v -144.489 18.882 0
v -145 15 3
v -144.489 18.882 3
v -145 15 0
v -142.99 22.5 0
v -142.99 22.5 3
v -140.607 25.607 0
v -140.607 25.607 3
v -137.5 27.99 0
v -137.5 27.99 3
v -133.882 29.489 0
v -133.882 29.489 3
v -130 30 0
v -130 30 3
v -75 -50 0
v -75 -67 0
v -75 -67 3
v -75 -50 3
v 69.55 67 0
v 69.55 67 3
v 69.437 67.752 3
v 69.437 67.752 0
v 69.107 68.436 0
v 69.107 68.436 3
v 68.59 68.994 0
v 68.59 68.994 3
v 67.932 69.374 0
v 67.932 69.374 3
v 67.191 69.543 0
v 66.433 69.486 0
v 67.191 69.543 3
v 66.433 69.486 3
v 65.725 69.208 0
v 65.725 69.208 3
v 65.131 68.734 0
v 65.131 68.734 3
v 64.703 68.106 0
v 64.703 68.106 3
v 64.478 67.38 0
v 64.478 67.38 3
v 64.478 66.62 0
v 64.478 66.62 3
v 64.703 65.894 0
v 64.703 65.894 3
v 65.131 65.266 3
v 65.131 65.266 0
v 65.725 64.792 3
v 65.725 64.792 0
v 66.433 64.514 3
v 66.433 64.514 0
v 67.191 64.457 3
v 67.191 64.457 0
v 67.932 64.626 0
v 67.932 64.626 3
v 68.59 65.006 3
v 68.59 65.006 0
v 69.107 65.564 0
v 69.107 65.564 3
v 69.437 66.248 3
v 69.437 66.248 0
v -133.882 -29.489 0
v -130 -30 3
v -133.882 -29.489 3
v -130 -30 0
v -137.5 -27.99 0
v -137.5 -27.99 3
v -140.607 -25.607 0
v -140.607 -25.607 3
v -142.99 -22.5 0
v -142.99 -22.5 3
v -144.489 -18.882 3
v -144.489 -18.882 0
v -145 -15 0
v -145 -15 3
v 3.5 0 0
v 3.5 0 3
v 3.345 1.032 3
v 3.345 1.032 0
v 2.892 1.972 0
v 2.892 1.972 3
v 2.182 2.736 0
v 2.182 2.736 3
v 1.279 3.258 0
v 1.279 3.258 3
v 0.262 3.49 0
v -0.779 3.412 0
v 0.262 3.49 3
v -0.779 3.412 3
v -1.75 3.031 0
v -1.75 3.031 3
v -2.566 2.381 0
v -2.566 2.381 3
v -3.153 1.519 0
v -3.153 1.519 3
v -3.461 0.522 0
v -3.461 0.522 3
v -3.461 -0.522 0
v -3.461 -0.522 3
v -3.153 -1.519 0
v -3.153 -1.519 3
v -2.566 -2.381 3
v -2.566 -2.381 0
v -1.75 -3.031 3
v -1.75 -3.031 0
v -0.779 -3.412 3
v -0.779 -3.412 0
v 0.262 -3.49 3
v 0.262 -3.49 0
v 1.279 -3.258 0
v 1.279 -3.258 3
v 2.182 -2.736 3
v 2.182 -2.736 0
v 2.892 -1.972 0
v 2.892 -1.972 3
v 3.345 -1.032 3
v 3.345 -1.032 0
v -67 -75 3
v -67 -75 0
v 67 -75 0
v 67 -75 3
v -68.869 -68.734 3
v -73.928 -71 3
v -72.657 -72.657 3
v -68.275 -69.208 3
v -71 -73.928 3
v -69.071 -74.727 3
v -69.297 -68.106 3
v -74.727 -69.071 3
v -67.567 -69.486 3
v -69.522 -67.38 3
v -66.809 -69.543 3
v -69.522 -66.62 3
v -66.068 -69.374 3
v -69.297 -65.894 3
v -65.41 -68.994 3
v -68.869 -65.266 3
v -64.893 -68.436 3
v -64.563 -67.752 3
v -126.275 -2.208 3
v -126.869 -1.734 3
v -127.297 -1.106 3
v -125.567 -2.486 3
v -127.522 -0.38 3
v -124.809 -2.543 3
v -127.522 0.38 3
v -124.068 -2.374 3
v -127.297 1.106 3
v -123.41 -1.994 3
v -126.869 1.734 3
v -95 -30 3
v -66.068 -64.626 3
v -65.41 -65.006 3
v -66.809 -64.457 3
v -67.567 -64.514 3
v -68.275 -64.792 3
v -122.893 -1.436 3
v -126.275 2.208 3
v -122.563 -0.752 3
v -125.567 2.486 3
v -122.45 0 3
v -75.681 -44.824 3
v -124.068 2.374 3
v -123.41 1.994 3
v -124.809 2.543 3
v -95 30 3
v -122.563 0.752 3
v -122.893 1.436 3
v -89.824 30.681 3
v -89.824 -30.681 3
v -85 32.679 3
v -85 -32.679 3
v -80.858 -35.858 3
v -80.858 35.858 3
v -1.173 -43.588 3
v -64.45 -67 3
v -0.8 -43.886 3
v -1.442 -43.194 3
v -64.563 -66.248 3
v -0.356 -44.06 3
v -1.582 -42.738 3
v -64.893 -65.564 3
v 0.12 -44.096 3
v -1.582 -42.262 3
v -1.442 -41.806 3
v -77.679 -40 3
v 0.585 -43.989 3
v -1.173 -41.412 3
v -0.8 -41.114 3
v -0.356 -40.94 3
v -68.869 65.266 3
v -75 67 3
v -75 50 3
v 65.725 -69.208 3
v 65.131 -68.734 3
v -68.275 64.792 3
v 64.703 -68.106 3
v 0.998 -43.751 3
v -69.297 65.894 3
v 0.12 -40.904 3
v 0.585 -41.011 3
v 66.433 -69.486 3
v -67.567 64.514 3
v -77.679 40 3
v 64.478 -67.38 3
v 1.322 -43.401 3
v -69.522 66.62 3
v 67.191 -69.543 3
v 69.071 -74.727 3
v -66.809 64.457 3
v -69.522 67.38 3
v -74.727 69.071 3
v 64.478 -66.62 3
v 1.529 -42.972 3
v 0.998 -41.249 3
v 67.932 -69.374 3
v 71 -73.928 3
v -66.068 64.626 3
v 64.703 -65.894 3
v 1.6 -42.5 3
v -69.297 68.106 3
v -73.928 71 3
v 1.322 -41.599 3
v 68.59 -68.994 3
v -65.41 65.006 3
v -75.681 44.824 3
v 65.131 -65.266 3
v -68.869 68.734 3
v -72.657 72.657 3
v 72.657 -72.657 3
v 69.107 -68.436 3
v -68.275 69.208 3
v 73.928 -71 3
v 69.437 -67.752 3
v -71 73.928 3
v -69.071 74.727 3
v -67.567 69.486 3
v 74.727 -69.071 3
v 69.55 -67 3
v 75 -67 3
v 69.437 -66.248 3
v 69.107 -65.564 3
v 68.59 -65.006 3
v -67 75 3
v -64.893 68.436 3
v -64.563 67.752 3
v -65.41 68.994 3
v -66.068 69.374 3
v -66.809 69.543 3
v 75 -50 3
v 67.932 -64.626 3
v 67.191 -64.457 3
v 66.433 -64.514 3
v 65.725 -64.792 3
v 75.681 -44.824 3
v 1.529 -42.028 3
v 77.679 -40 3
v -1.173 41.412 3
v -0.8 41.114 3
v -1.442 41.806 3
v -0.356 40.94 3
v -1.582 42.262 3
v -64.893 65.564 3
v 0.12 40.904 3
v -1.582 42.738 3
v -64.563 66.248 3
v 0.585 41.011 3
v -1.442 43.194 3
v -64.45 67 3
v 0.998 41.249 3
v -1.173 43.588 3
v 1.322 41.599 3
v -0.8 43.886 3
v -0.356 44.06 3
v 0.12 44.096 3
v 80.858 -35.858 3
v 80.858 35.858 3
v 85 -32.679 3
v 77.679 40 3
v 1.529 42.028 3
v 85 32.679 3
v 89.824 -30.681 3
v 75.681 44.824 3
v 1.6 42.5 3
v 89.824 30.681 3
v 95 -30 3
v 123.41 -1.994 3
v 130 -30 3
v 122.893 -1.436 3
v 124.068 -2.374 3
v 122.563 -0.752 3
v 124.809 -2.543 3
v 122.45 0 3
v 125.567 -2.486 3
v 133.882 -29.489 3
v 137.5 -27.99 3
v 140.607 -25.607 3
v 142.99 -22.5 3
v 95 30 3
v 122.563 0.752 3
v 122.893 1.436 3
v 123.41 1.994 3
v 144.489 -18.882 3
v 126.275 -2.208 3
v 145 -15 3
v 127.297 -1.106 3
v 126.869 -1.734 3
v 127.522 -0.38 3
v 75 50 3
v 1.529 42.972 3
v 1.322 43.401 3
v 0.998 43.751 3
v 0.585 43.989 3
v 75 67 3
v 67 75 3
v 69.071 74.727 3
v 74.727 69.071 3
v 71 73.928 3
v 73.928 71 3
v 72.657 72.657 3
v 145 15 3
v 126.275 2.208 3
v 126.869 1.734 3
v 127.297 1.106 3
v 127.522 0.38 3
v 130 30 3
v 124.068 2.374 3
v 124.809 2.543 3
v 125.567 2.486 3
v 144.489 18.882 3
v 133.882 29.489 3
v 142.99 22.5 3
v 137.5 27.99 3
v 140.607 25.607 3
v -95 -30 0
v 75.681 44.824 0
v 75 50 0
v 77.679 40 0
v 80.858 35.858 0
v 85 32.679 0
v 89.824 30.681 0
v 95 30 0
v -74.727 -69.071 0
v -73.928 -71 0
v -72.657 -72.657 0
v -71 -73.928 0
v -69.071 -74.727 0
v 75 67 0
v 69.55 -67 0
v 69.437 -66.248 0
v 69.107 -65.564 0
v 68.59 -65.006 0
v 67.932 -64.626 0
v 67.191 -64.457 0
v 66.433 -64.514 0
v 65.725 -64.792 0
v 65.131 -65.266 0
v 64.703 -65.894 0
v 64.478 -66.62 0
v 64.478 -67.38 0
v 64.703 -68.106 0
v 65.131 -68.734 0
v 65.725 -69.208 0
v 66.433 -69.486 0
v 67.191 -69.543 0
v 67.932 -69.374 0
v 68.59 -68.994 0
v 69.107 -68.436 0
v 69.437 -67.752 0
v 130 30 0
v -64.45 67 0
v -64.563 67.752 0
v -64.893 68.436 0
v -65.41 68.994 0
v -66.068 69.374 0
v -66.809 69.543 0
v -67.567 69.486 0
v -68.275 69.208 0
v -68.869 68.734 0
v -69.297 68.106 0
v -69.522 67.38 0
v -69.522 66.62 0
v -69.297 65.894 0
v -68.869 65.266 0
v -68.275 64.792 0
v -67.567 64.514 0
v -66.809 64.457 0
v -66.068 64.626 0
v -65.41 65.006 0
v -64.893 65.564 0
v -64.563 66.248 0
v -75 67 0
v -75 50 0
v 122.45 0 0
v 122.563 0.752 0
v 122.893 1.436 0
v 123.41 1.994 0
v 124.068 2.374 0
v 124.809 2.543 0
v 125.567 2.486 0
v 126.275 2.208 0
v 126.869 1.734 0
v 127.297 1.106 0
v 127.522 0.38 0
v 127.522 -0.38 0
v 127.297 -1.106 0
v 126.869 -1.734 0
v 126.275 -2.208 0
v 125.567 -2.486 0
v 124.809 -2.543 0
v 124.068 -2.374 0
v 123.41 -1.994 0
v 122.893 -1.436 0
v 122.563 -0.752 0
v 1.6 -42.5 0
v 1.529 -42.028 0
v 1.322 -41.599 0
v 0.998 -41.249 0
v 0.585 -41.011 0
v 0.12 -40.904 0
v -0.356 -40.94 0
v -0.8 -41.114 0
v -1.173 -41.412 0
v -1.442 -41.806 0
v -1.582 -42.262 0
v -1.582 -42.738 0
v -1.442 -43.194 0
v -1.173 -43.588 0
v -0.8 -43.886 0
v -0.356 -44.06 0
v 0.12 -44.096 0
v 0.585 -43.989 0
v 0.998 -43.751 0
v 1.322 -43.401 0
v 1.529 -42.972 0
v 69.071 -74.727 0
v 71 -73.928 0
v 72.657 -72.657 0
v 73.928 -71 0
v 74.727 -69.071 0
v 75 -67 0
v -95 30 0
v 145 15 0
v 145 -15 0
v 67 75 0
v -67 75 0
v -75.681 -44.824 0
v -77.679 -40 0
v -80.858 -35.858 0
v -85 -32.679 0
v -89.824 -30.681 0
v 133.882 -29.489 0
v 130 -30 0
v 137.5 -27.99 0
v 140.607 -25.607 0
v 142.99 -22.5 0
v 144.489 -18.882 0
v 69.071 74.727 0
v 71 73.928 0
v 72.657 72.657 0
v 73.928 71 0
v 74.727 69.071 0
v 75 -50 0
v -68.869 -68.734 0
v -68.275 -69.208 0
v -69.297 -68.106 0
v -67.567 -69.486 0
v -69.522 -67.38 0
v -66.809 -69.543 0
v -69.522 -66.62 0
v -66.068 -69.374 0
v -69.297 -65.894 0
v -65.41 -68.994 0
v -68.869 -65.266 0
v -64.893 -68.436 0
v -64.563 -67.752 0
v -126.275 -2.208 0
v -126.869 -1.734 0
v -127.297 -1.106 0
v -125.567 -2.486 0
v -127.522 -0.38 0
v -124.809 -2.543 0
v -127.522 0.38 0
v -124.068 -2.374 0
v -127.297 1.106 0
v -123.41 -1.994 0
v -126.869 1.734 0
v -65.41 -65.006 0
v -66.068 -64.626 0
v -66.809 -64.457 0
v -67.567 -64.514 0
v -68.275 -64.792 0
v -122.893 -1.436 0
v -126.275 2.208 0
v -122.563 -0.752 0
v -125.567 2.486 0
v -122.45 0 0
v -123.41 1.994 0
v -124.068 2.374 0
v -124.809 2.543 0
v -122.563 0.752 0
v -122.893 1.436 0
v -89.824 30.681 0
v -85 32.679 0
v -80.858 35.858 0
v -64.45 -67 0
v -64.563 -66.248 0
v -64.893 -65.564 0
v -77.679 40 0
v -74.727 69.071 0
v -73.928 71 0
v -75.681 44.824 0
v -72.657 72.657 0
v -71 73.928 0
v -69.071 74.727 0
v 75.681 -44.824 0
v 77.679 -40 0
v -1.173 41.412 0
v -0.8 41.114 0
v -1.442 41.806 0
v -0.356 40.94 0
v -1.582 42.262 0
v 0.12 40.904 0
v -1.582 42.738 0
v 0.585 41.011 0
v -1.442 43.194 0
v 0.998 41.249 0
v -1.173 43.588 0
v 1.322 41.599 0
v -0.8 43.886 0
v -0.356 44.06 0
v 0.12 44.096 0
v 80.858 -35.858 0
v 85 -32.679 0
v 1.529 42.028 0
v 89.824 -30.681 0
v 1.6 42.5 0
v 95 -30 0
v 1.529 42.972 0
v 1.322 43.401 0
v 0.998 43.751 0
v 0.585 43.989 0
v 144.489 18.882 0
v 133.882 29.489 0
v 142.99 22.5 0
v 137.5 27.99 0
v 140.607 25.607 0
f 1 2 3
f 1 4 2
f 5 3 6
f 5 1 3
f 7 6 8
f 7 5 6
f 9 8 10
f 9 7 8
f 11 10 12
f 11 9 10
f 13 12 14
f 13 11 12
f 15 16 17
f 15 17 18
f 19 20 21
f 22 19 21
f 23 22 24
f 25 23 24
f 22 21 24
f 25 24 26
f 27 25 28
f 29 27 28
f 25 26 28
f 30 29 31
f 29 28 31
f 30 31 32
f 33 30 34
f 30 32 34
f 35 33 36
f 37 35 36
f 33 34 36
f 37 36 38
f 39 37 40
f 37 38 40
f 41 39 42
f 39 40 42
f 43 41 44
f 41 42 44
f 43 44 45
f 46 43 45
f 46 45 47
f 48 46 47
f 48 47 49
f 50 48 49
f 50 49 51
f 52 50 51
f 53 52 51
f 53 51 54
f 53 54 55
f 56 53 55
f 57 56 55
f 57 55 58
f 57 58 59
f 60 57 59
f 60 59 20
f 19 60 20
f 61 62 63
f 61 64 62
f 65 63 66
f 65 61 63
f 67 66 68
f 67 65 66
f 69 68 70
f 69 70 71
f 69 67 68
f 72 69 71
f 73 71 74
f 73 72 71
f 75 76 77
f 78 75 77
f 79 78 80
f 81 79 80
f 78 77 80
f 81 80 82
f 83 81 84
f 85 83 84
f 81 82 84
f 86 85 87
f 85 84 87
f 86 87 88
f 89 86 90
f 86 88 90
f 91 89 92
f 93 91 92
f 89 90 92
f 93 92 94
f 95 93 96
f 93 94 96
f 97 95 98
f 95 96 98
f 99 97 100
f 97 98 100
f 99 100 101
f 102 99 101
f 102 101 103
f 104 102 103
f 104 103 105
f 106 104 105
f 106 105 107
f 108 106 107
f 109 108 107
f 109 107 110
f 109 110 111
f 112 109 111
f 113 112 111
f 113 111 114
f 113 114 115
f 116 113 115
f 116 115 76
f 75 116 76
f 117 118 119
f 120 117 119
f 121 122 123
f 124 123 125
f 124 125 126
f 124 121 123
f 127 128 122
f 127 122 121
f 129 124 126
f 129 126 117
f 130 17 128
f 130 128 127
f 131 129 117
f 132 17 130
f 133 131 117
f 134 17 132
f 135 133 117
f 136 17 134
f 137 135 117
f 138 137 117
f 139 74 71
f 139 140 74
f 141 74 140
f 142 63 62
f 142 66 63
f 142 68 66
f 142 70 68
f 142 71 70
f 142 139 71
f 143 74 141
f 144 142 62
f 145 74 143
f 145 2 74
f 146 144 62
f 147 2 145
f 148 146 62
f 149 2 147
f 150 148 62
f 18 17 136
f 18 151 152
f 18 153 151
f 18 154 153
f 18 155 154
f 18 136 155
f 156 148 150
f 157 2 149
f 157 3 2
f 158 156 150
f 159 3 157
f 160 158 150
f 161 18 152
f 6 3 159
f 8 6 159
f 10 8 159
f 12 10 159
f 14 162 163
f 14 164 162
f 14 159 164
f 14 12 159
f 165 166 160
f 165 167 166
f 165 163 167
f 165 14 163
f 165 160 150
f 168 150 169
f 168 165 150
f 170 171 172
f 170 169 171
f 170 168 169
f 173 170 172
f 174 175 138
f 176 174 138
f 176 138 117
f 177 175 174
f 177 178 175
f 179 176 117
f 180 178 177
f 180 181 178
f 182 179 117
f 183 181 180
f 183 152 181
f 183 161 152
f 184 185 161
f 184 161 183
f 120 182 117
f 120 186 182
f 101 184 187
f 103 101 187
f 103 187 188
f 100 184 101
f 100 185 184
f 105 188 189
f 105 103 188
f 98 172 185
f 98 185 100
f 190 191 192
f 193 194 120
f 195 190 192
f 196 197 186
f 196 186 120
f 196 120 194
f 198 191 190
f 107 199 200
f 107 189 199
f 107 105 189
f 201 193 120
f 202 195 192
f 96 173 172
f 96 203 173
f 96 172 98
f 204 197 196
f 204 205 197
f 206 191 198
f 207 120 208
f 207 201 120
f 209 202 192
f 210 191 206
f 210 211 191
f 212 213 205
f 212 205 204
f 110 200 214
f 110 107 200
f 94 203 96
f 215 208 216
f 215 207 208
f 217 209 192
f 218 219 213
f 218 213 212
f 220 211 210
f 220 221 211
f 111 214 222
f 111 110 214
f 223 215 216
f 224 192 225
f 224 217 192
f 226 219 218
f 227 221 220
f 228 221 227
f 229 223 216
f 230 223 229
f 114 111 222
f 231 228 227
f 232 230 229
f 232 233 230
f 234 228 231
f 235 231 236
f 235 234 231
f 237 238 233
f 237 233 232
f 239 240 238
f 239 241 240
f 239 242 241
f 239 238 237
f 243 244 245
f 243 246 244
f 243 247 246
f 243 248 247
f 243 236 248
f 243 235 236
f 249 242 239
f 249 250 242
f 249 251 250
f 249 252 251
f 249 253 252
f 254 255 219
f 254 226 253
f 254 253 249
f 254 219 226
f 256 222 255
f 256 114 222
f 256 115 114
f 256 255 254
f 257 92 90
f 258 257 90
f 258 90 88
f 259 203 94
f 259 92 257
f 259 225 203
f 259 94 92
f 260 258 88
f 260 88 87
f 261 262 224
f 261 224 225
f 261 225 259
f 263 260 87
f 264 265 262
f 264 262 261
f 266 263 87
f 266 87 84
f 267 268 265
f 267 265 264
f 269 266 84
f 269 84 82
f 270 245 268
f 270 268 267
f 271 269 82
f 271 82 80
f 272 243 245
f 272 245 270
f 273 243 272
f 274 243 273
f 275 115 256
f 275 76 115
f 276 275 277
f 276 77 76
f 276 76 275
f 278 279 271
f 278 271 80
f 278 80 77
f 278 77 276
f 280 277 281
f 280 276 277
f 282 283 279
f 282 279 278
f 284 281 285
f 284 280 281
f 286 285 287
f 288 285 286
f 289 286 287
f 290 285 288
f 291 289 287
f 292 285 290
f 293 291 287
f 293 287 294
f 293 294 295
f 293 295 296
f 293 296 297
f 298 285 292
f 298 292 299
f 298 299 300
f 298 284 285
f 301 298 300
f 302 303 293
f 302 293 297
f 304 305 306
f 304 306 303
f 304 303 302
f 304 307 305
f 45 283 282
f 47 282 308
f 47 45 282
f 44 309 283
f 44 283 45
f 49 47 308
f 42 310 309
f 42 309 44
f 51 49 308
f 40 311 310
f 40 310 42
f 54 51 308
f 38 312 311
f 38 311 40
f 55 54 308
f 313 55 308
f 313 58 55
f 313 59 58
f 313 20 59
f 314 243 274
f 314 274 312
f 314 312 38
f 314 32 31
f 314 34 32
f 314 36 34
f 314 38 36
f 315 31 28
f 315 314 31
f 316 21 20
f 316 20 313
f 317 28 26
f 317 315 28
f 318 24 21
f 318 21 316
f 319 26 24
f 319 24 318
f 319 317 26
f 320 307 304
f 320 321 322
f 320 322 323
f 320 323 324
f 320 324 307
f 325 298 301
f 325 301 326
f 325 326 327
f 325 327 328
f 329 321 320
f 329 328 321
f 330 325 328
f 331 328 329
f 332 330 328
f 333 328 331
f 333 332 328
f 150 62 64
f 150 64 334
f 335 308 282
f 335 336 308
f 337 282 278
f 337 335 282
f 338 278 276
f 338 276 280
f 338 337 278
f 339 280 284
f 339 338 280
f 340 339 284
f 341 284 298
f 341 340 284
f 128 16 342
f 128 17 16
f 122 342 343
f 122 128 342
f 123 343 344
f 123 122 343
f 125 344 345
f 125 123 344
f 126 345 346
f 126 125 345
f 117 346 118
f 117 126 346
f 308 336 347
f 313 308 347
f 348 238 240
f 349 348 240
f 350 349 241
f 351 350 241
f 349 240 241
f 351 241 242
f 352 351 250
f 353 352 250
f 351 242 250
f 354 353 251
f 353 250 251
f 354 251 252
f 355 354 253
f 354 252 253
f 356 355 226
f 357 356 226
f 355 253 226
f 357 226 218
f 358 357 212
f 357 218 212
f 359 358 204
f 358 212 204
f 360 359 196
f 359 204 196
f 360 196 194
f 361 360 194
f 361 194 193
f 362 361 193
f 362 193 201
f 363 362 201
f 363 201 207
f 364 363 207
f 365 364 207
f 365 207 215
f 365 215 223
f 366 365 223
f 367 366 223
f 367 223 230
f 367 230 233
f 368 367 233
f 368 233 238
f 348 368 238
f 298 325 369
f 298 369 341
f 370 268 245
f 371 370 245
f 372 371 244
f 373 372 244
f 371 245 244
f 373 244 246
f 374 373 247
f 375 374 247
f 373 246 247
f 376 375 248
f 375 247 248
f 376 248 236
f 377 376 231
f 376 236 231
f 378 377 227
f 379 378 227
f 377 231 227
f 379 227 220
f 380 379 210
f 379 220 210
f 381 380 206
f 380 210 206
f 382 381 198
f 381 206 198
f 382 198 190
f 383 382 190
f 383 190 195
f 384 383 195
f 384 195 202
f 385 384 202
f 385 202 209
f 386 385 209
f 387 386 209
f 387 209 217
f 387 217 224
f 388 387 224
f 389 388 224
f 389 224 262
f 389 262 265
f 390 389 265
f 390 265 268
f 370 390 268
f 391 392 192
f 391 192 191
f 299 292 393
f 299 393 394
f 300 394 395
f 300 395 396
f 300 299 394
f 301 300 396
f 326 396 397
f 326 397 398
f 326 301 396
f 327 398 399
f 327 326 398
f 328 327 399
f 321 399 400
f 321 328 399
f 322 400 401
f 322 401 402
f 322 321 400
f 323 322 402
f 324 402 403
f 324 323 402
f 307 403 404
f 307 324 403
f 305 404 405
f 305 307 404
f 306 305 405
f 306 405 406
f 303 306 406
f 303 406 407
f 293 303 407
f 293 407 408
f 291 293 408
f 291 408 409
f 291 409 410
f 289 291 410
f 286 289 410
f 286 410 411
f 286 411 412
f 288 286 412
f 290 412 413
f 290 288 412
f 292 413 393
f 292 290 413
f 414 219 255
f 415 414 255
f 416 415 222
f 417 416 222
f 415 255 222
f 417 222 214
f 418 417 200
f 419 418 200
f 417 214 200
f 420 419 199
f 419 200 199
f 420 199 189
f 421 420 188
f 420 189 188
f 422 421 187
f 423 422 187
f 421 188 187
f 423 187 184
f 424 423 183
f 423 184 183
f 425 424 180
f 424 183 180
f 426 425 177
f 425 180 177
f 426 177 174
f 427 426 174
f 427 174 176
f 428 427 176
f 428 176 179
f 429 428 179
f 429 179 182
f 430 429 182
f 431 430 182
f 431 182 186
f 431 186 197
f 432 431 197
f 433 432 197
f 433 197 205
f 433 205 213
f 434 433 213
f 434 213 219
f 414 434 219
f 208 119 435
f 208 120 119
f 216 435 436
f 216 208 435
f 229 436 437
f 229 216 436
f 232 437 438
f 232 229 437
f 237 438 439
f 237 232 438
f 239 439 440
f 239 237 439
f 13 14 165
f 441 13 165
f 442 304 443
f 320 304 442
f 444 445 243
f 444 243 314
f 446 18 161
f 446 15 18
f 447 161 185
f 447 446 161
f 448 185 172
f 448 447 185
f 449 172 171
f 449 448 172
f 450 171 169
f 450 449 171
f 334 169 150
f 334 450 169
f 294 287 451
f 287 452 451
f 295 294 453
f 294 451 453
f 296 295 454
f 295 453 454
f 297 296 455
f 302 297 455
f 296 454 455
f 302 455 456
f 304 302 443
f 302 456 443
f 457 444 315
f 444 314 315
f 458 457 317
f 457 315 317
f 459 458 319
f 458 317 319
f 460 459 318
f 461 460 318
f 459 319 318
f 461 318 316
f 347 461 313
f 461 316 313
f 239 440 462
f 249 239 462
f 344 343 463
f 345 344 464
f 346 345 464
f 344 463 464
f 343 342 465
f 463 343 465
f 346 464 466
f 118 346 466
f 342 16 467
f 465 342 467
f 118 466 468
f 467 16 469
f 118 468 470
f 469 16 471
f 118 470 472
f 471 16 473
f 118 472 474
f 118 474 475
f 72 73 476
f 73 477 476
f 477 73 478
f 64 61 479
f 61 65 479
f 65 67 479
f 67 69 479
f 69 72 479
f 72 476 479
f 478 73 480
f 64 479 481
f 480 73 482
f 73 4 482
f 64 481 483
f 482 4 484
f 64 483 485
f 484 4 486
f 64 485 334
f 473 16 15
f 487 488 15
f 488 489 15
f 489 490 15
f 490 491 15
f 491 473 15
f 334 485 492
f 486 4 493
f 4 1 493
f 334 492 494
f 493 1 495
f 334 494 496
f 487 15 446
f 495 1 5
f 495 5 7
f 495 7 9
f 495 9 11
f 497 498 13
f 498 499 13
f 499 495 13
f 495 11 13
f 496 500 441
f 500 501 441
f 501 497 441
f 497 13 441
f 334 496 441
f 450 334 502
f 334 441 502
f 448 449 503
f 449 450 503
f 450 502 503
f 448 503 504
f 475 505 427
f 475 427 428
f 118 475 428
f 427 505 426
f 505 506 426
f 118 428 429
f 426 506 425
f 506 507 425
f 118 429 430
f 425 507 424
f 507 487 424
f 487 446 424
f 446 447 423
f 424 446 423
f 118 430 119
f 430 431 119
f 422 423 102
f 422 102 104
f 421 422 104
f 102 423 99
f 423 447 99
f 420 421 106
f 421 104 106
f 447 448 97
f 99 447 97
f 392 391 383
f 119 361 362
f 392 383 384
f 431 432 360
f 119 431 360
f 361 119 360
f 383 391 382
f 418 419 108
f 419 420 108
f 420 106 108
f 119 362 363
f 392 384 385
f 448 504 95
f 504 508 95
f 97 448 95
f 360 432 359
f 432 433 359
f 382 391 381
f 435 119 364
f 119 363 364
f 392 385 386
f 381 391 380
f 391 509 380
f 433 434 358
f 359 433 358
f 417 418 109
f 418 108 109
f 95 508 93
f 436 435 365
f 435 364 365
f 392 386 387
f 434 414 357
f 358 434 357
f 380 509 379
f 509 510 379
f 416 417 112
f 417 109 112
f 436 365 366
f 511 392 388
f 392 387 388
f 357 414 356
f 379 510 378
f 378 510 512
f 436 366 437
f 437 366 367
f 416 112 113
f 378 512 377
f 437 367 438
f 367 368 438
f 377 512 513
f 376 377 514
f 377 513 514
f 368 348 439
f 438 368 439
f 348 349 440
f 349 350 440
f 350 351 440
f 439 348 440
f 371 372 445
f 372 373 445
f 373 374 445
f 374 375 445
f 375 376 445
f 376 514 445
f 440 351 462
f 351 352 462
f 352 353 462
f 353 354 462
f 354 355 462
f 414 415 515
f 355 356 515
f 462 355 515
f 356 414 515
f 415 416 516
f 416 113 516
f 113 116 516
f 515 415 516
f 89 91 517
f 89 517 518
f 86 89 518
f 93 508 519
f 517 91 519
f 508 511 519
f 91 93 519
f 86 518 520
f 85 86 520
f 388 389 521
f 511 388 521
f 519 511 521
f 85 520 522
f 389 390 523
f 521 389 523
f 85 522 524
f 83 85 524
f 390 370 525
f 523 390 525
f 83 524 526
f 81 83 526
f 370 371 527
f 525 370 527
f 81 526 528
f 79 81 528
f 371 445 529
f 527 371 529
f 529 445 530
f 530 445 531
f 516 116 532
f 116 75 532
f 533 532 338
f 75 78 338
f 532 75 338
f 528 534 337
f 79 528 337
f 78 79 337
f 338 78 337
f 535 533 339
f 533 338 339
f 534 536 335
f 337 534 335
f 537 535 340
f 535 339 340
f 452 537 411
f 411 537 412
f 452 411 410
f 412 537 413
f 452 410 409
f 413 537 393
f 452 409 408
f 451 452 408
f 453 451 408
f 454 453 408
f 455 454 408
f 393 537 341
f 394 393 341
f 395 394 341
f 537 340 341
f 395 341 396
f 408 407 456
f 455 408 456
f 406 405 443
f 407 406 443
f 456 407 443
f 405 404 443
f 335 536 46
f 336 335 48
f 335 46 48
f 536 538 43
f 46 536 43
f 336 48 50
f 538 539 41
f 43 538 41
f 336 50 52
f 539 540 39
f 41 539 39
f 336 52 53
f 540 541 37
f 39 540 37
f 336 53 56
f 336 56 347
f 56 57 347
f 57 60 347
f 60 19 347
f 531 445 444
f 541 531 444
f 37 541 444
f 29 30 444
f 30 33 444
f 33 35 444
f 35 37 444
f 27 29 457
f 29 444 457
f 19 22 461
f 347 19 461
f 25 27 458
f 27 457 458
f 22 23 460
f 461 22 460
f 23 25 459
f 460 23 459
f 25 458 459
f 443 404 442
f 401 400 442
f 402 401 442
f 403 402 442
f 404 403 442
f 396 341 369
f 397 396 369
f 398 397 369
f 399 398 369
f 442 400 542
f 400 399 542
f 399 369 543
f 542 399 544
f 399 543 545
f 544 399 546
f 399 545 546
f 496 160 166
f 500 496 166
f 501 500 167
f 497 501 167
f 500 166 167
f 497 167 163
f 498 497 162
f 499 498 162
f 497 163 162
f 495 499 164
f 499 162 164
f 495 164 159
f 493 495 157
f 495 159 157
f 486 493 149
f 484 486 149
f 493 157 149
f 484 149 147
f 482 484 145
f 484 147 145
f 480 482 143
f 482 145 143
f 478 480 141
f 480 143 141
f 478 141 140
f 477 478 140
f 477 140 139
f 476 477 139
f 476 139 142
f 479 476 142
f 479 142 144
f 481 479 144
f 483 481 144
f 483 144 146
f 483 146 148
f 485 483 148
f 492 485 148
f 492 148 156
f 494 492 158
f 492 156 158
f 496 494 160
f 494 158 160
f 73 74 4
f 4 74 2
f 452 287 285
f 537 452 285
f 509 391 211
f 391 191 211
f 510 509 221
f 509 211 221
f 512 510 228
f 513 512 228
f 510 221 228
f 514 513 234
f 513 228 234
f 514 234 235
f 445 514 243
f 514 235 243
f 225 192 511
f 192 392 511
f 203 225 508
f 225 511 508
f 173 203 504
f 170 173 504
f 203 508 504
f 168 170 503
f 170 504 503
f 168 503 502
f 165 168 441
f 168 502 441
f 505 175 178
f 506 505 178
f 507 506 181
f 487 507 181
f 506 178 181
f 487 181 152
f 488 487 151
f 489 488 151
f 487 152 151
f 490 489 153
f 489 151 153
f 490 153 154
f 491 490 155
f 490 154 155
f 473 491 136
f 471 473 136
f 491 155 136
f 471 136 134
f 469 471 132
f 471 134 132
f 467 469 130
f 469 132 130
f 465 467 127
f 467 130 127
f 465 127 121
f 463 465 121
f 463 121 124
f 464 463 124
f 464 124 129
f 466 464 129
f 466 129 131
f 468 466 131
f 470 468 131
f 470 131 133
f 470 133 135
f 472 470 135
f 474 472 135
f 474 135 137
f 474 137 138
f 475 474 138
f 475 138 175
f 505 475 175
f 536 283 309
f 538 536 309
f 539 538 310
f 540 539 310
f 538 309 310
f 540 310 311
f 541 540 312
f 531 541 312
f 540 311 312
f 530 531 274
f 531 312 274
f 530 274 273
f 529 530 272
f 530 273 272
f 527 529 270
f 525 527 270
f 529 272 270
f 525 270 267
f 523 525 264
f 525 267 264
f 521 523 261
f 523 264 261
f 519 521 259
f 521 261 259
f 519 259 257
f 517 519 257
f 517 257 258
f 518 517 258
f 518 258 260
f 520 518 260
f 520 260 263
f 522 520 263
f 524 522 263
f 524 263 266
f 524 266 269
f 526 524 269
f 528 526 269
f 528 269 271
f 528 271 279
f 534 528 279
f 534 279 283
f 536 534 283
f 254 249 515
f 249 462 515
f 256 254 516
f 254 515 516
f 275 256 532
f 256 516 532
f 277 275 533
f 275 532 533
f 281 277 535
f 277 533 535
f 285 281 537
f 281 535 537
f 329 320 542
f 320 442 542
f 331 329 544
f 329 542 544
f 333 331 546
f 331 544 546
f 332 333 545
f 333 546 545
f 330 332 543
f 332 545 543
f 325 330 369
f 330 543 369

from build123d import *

# Parameters (mm, degrees)
SKETCH_1_W          = 150
SKETCH_1_H          = 150
EXTRUDE_1_DEPTH     = 3
SKETCH_4_R          = 2.55
SKETCH_4_R_2        = 3.5
CUT_EXTRUDE_3_DEPTH = 7
FILLET_1_R          = 8
SKETCH_6_W          = 70
SKETCH_6_H          = 60
SKETCH_6_R          = 2.55
EXTRUDE_2_DEPTH     = 3
FILLET_2_R          = 20
FILLET_3_R          = 15
SKETCH_7_R          = 1.6
CUT_EXTRUDE_5_DEPTH = 10


with BuildPart() as part:
    # 草图1 → 凸台-拉伸1 (new body)
    with BuildSketch(Plane.XY):
        Rectangle(SKETCH_1_W, SKETCH_1_H)
    extrude(amount=EXTRUDE_1_DEPTH)

    # 草图4 → 切除-拉伸3 (cut)
    with BuildSketch(Plane.XY.offset(3)):
        with Locations((-67, 67)):
            Circle(SKETCH_4_R)
        with Locations((-67, -67)):
            Circle(SKETCH_4_R)
        with Locations((67, -67)):
            Circle(SKETCH_4_R)
        with Locations((67, 67)):
            Circle(SKETCH_4_R)
        Circle(SKETCH_4_R_2)
    extrude(amount=-CUT_EXTRUDE_3_DEPTH, mode=Mode.SUBTRACT)

    # 圆角1
    fillet_1_edges = [part.edges().sort_by_distance(p)[0] for p in [
        (75, -75, 1.5),
        (-75, -75, 1.5),
        (-75, 75, 1.5),
        (75, 75, 1.5),
    ]]
    fillet(fillet_1_edges, radius=FILLET_1_R)

    # 草图6 → 凸台-拉伸2 (add)
    with BuildSketch(Plane.XY.offset(3)):
        with Locations((-110, 0)):
            Rectangle(SKETCH_6_W, SKETCH_6_H)
        with Locations((-125, 0)):
            Circle(SKETCH_6_R, mode=Mode.SUBTRACT)
    extrude_2 = extrude(amount=-EXTRUDE_2_DEPTH)

    # 镜向1: 凸台-拉伸2 across plane
    add(extrude_2.mirror(Plane(origin=(0, 0, 0), x_dir=(0, 0, 1), z_dir=(1, 0, 0))))

    # 圆角2
    fillet_2_edges = [part.edges().sort_by_distance(p)[0] for p in [
        (-75, -30, 1.5),
        (-75, 30, 1.5),
        (75, -30, 1.5),
        (75, 30, 1.5),
    ]]
    fillet(fillet_2_edges, radius=FILLET_2_R)

    # 圆角3
    fillet_3_edges = [part.edges().sort_by_distance(p)[0] for p in [
        (-145, 30, 1.5),
        (-145, -30, 1.5),
        (145, 30, 1.5),
        (145, -30, 1.5),
    ]]
    fillet(fillet_3_edges, radius=FILLET_3_R)

    # 草图7 → 切除-拉伸5 (cut)
    with BuildSketch(Plane.XY.offset(3)):
        with Locations((0, 42.5)):
            Circle(SKETCH_7_R)
        with Locations((0, -42.5)):
            Circle(SKETCH_7_R)
    extrude(amount=-CUT_EXTRUDE_5_DEPTH, mode=Mode.SUBTRACT)


solid = part.part
